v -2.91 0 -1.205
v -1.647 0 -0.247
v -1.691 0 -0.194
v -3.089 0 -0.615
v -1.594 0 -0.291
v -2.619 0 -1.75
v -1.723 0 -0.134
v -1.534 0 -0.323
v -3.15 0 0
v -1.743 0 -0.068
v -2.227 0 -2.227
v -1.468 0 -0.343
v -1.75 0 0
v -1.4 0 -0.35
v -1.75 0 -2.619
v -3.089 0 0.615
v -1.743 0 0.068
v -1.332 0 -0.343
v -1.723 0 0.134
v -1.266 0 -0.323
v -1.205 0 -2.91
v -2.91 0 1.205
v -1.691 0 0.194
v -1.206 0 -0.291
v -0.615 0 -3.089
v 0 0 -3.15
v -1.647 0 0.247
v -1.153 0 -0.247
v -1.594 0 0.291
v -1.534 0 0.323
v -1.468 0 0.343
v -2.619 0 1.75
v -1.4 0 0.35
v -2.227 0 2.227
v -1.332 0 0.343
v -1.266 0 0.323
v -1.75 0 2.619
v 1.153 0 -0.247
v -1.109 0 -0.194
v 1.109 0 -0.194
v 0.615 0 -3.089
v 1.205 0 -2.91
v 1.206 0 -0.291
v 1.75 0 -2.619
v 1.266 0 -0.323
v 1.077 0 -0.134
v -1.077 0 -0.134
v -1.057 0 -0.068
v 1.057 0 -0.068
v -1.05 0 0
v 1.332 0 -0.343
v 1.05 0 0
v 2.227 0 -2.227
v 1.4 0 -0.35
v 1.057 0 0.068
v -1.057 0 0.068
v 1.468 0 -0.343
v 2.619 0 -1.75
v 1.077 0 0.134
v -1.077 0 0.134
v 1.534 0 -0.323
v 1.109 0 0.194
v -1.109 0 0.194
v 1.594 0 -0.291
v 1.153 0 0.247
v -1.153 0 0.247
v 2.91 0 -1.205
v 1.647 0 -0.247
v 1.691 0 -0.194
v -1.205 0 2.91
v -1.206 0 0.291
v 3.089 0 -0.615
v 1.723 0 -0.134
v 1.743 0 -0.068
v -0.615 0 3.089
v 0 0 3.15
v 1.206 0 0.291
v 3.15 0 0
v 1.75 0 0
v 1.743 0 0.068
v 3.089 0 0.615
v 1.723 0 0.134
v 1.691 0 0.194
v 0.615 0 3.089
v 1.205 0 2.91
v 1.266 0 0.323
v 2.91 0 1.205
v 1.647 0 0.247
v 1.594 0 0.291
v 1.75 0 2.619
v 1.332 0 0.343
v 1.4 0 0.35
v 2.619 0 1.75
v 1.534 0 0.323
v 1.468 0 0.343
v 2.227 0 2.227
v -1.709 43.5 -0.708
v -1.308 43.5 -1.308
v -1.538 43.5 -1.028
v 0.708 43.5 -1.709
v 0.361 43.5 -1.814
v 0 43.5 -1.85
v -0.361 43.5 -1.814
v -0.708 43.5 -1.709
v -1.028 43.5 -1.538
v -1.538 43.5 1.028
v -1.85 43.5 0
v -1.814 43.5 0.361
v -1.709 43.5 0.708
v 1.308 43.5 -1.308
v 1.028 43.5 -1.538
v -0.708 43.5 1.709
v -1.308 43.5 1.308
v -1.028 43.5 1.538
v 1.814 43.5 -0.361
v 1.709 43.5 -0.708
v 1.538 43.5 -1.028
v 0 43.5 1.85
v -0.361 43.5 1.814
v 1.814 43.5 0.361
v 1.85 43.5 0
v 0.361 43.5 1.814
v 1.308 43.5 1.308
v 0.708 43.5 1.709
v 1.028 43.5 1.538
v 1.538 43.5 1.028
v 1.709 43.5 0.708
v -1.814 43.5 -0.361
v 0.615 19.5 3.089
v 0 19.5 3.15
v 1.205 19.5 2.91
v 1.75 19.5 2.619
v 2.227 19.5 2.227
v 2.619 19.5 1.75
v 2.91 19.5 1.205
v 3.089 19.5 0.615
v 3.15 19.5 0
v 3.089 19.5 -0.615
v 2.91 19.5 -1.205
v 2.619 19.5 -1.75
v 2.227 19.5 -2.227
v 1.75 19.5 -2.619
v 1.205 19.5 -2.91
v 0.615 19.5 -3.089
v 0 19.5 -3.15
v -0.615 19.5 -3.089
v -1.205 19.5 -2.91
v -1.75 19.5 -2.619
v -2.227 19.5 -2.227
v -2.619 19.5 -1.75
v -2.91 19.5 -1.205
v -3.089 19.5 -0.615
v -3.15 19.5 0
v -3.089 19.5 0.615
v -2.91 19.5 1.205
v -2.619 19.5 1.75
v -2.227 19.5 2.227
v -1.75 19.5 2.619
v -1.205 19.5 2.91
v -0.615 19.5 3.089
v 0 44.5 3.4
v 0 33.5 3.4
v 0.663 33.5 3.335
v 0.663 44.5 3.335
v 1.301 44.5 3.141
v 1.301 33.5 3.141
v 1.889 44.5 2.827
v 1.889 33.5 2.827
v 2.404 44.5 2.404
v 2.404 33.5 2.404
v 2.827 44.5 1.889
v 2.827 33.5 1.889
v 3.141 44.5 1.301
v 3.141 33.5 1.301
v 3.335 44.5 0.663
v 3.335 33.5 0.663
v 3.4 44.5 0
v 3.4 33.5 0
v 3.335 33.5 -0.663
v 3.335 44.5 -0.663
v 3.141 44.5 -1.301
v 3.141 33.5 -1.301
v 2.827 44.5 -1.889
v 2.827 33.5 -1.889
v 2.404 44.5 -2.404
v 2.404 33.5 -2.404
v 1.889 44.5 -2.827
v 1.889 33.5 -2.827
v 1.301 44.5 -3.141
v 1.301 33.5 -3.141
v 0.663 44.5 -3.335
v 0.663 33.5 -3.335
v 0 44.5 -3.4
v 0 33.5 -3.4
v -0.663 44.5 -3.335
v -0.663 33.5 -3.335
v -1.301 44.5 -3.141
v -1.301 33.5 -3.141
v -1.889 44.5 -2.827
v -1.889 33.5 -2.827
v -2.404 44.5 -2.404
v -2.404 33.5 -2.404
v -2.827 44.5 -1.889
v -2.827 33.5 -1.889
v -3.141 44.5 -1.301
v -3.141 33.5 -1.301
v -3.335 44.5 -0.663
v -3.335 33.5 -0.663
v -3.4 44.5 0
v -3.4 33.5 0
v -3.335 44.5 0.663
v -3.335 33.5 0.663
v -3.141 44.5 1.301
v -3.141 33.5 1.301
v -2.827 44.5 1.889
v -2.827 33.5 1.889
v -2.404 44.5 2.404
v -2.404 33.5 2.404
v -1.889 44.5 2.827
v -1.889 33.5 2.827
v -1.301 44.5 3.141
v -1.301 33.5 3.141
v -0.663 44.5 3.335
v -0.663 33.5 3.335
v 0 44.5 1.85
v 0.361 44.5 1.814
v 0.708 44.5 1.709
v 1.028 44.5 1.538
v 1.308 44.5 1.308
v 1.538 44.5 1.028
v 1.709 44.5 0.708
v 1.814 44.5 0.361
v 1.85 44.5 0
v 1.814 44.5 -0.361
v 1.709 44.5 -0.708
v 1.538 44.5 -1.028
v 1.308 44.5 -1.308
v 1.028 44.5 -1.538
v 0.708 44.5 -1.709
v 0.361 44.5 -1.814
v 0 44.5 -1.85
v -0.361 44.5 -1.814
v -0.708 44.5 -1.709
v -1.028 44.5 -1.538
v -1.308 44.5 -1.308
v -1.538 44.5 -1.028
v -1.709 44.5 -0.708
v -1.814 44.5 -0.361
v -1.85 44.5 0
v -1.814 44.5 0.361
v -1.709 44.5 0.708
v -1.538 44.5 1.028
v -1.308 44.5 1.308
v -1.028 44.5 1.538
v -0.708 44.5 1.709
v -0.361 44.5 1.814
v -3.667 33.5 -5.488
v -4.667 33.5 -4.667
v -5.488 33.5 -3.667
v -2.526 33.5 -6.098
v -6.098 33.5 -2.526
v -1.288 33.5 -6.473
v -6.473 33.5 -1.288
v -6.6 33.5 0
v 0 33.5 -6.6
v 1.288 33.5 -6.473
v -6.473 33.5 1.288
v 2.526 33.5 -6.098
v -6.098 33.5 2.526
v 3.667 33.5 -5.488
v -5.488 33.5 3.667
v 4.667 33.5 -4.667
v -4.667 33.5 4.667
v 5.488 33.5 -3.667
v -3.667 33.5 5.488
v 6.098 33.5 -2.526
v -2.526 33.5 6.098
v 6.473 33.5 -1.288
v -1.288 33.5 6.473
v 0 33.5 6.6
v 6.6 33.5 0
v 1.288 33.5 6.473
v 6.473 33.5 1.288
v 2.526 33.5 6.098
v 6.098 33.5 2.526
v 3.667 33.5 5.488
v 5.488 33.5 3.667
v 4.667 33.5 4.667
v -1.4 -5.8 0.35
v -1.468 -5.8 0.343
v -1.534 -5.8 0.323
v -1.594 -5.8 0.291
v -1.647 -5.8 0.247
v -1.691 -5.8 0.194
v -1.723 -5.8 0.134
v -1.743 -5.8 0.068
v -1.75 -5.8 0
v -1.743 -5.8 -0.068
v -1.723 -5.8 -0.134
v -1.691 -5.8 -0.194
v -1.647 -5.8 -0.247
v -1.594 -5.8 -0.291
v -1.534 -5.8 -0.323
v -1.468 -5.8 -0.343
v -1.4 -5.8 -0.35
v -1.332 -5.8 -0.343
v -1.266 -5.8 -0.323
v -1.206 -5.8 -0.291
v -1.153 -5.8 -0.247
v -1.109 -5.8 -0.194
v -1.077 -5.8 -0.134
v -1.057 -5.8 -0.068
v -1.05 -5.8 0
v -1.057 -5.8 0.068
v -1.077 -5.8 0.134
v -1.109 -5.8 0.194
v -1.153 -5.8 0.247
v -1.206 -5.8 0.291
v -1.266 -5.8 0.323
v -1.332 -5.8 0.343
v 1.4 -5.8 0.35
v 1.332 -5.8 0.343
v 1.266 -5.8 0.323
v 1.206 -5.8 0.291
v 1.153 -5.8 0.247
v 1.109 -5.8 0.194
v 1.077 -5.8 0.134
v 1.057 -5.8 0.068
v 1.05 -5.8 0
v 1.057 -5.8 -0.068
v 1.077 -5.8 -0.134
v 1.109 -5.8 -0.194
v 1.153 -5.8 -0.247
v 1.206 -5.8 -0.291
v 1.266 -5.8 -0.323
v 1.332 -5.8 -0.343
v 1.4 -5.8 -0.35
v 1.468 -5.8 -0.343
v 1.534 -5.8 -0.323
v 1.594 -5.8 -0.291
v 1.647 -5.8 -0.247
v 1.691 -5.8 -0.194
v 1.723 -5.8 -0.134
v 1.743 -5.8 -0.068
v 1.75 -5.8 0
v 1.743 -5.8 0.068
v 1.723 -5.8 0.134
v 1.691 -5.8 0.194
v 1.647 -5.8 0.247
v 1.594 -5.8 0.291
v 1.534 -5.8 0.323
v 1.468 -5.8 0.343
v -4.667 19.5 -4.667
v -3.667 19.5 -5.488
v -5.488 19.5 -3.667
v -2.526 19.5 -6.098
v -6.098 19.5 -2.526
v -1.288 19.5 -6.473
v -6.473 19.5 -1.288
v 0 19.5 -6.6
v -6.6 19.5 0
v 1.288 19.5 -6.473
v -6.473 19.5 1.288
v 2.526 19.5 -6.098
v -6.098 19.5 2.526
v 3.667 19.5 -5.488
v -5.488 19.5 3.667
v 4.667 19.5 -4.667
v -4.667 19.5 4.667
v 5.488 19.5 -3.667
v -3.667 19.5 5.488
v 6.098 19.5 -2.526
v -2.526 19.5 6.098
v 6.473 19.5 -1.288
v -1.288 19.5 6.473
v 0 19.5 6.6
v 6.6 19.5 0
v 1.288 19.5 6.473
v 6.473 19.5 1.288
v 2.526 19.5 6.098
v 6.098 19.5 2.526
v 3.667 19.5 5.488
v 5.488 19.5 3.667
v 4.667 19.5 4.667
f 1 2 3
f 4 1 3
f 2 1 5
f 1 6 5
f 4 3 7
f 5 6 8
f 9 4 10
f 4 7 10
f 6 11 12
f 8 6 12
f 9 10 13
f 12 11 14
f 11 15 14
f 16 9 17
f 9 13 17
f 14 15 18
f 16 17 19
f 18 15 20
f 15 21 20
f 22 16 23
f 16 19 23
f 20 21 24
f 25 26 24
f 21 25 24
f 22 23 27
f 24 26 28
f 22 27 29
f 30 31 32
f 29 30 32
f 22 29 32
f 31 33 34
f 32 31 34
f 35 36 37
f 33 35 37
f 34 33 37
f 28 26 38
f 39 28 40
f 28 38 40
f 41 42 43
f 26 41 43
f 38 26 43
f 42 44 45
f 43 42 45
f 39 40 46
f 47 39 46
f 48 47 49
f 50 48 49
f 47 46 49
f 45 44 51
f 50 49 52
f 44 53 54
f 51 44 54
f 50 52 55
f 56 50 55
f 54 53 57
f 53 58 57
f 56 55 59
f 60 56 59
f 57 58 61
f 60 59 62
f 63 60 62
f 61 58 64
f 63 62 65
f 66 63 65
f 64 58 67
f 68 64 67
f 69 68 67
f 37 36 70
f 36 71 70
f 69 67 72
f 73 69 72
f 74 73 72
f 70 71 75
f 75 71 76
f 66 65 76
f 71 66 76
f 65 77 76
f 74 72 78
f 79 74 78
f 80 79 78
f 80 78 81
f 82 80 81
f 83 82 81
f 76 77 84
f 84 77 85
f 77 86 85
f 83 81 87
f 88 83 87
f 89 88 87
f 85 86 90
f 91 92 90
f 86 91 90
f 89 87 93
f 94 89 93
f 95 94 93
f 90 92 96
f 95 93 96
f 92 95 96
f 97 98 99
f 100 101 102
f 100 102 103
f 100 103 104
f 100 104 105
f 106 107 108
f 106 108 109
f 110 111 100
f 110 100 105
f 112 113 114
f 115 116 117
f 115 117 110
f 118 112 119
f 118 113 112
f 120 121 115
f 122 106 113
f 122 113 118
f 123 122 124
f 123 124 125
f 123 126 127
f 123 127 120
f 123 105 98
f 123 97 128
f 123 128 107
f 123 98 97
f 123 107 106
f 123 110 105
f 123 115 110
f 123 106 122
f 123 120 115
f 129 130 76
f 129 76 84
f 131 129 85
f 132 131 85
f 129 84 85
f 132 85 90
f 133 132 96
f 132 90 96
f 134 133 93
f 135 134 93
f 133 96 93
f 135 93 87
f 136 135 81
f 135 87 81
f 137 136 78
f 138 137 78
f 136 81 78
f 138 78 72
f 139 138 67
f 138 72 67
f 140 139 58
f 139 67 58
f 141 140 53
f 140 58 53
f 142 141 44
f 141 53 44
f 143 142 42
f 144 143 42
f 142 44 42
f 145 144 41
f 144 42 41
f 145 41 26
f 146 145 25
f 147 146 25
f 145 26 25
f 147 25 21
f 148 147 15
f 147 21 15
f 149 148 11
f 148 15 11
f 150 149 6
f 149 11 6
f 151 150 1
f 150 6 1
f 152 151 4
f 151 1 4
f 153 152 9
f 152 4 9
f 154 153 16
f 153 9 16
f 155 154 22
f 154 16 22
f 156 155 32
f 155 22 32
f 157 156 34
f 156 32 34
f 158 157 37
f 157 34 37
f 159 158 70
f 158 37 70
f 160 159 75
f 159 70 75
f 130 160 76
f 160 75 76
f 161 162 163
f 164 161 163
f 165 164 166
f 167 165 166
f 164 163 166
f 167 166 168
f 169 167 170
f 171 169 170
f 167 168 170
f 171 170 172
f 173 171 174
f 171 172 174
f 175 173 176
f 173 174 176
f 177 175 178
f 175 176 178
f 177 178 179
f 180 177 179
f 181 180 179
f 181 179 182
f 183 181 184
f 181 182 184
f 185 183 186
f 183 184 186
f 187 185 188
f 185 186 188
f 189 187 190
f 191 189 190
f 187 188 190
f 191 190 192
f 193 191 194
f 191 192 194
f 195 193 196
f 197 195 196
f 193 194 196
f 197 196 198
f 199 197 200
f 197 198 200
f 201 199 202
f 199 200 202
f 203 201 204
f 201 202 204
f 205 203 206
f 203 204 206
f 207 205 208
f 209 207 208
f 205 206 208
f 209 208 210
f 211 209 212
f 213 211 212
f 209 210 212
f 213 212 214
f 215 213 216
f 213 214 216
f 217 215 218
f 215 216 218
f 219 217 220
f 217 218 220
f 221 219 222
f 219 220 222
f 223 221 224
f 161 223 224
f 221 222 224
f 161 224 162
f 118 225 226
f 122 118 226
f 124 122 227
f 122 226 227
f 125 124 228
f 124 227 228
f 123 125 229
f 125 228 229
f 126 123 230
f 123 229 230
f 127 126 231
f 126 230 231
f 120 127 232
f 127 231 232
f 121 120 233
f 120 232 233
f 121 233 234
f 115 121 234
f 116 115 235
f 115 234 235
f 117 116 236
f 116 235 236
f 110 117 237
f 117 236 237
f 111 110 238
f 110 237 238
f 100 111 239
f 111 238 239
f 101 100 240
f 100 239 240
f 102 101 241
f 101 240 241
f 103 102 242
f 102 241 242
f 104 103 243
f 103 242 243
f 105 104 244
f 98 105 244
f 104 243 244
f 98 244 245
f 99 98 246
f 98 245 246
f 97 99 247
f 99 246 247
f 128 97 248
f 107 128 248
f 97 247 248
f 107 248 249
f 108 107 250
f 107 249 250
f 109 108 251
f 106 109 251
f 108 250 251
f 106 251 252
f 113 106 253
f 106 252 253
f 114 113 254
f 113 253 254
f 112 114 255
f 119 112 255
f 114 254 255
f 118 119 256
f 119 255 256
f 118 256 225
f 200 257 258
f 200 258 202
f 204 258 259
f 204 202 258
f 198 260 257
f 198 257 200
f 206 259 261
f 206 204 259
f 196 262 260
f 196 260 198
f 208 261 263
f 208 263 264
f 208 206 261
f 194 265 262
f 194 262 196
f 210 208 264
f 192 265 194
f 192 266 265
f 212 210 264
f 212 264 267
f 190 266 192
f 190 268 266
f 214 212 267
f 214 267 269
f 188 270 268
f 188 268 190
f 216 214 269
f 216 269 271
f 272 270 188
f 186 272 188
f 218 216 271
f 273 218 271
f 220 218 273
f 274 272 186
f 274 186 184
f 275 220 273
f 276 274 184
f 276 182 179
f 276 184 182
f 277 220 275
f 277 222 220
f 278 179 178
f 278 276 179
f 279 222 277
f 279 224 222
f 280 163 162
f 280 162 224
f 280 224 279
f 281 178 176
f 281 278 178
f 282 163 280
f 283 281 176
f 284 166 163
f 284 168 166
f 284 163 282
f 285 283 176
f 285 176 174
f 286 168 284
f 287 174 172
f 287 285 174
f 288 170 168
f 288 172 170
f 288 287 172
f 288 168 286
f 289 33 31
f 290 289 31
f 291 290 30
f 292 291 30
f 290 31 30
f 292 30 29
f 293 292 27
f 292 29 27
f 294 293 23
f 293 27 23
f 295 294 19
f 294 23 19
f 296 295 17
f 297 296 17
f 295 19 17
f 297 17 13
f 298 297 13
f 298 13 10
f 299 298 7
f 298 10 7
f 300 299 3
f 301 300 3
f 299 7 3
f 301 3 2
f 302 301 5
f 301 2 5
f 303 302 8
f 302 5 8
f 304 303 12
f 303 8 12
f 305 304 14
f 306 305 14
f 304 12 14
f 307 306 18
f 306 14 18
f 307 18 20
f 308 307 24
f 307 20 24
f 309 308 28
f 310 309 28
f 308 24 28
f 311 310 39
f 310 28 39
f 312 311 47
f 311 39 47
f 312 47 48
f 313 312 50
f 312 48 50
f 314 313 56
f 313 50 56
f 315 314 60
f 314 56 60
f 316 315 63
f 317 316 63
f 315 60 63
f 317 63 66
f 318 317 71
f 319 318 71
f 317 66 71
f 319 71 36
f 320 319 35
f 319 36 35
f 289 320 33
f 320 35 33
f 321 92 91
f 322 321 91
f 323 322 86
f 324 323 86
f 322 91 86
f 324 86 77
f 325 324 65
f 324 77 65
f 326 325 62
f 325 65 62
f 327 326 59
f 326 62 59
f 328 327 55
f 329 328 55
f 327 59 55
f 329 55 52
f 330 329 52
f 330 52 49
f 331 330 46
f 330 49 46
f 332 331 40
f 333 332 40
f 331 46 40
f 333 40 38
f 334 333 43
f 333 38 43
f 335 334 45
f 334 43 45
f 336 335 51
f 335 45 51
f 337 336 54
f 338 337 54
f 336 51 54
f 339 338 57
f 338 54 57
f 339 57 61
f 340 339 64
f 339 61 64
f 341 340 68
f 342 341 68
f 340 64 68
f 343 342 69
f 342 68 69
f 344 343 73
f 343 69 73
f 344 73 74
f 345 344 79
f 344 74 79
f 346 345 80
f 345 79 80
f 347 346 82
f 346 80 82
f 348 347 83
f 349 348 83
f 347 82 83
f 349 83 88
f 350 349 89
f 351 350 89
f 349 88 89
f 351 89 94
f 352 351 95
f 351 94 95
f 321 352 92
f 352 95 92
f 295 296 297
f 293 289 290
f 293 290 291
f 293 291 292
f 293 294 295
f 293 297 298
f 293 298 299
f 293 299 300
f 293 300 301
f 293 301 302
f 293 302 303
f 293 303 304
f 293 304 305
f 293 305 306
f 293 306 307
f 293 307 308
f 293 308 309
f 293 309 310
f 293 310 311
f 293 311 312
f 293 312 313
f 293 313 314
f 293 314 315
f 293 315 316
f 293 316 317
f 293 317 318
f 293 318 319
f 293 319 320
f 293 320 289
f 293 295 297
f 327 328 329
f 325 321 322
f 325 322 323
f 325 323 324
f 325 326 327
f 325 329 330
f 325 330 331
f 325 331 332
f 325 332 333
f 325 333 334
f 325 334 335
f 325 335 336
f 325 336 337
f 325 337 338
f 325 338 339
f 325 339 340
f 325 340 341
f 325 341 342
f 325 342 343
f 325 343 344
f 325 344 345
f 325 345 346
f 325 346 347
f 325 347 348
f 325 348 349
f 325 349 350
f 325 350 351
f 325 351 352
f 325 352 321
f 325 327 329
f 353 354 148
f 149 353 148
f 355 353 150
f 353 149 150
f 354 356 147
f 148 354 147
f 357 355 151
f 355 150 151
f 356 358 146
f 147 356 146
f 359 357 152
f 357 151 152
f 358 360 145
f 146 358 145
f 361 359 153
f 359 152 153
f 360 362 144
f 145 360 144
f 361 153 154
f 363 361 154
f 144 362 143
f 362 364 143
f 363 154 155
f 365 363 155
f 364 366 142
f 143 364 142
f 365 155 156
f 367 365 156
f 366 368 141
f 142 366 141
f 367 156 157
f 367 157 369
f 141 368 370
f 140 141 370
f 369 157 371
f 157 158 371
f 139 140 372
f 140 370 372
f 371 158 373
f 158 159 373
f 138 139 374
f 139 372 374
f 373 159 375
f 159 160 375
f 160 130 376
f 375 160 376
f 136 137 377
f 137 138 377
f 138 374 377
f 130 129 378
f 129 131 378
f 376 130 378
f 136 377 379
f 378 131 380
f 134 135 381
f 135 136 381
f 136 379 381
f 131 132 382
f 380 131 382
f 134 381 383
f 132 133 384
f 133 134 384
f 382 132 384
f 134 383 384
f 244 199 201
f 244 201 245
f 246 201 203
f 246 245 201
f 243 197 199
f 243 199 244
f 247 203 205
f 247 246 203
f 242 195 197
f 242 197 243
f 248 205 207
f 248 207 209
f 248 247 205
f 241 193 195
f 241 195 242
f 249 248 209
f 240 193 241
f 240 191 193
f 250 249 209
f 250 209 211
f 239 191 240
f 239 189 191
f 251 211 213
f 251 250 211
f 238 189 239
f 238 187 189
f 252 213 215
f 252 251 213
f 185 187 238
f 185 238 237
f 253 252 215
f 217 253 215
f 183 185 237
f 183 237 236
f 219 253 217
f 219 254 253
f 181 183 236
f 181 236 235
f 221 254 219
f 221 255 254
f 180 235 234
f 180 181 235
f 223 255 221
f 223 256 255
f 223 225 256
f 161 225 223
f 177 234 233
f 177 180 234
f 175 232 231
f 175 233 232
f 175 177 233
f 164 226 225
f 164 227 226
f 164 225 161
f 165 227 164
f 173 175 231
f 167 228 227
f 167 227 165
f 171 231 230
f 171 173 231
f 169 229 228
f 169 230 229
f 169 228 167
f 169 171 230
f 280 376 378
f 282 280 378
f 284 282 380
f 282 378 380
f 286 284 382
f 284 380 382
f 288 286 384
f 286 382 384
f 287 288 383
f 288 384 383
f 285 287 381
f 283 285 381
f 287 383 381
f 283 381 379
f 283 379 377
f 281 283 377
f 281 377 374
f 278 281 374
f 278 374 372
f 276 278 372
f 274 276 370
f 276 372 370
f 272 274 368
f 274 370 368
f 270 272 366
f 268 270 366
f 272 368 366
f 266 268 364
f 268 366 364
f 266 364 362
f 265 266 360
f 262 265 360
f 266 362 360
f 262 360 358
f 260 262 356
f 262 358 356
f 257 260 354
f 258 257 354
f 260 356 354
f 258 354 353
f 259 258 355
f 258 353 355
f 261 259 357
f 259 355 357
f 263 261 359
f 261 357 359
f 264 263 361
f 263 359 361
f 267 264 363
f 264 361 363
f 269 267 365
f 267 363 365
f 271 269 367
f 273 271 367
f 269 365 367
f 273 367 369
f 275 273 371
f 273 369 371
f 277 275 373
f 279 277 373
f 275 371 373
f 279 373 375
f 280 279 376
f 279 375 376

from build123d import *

# Parameters (mm, degrees)
SKETCH1_R           = 3.15
BOSS_EXTRUDE1_DEPTH = 19.5
SKETCH2_R           = 0.35
BOSS_EXTRUDE2_DEPTH = 5.8
SKETCH3_R           = 6.6
BOSS_EXTRUDE3_DEPTH = 14
SKETCH4_R           = 3.4
BOSS_EXTRUDE4_DEPTH = 11
SKETCH5_R           = 1.85
CUT_EXTRUDE1_DEPTH  = 1


with BuildPart() as part:
    # Sketch1 → Boss-Extrude1 (new body)
    with BuildSketch(Plane(origin=(0, 0, 0), x_dir=(1, 0, 0), z_dir=(0, 1, 0))):
        with Locations(Location((0, 0, 0), (0, 0, 270))):
            Circle(SKETCH1_R)
    extrude(amount=BOSS_EXTRUDE1_DEPTH)

    # Sketch2 → Boss-Extrude2 (add)
    with BuildSketch(Plane.XZ):
        with Locations(Location((-1.4, 0, 0), (0, 0, 90))):
            Circle(SKETCH2_R)
        with Locations(Location((1.4, 0, 0), (0, 0, 90))):
            Circle(SKETCH2_R)
    extrude(amount=BOSS_EXTRUDE2_DEPTH)

    # Sketch3 → Boss-Extrude3 (add)
    with BuildSketch(Plane(origin=(0, 19.5, 0), x_dir=(1, 0, 0), z_dir=(0, 1, 0))):
        with Locations(Location((0, 0, 0), (0, 0, 270))):
            Circle(SKETCH3_R)
    extrude(amount=BOSS_EXTRUDE3_DEPTH)

    # Sketch4 → Boss-Extrude4 (add)
    with BuildSketch(Plane(origin=(0, 33.5, 0), x_dir=(1, 0, 0), z_dir=(0, 1, 0))):
        with Locations(Location((0, 0, 0), (0, 0, 270))):
            Circle(SKETCH4_R)
    extrude(amount=BOSS_EXTRUDE4_DEPTH)

    # Sketch5 → Cut-Extrude1 (cut)
    with BuildSketch(Plane(origin=(0, 44.5, 0), x_dir=(1, 0, 0), z_dir=(0, 1, 0))):
        with Locations(Location((0, 0, 0), (0, 0, 270))):
            Circle(SKETCH5_R)
    extrude(amount=-CUT_EXTRUDE1_DEPTH, mode=Mode.SUBTRACT)


solid = part.part
